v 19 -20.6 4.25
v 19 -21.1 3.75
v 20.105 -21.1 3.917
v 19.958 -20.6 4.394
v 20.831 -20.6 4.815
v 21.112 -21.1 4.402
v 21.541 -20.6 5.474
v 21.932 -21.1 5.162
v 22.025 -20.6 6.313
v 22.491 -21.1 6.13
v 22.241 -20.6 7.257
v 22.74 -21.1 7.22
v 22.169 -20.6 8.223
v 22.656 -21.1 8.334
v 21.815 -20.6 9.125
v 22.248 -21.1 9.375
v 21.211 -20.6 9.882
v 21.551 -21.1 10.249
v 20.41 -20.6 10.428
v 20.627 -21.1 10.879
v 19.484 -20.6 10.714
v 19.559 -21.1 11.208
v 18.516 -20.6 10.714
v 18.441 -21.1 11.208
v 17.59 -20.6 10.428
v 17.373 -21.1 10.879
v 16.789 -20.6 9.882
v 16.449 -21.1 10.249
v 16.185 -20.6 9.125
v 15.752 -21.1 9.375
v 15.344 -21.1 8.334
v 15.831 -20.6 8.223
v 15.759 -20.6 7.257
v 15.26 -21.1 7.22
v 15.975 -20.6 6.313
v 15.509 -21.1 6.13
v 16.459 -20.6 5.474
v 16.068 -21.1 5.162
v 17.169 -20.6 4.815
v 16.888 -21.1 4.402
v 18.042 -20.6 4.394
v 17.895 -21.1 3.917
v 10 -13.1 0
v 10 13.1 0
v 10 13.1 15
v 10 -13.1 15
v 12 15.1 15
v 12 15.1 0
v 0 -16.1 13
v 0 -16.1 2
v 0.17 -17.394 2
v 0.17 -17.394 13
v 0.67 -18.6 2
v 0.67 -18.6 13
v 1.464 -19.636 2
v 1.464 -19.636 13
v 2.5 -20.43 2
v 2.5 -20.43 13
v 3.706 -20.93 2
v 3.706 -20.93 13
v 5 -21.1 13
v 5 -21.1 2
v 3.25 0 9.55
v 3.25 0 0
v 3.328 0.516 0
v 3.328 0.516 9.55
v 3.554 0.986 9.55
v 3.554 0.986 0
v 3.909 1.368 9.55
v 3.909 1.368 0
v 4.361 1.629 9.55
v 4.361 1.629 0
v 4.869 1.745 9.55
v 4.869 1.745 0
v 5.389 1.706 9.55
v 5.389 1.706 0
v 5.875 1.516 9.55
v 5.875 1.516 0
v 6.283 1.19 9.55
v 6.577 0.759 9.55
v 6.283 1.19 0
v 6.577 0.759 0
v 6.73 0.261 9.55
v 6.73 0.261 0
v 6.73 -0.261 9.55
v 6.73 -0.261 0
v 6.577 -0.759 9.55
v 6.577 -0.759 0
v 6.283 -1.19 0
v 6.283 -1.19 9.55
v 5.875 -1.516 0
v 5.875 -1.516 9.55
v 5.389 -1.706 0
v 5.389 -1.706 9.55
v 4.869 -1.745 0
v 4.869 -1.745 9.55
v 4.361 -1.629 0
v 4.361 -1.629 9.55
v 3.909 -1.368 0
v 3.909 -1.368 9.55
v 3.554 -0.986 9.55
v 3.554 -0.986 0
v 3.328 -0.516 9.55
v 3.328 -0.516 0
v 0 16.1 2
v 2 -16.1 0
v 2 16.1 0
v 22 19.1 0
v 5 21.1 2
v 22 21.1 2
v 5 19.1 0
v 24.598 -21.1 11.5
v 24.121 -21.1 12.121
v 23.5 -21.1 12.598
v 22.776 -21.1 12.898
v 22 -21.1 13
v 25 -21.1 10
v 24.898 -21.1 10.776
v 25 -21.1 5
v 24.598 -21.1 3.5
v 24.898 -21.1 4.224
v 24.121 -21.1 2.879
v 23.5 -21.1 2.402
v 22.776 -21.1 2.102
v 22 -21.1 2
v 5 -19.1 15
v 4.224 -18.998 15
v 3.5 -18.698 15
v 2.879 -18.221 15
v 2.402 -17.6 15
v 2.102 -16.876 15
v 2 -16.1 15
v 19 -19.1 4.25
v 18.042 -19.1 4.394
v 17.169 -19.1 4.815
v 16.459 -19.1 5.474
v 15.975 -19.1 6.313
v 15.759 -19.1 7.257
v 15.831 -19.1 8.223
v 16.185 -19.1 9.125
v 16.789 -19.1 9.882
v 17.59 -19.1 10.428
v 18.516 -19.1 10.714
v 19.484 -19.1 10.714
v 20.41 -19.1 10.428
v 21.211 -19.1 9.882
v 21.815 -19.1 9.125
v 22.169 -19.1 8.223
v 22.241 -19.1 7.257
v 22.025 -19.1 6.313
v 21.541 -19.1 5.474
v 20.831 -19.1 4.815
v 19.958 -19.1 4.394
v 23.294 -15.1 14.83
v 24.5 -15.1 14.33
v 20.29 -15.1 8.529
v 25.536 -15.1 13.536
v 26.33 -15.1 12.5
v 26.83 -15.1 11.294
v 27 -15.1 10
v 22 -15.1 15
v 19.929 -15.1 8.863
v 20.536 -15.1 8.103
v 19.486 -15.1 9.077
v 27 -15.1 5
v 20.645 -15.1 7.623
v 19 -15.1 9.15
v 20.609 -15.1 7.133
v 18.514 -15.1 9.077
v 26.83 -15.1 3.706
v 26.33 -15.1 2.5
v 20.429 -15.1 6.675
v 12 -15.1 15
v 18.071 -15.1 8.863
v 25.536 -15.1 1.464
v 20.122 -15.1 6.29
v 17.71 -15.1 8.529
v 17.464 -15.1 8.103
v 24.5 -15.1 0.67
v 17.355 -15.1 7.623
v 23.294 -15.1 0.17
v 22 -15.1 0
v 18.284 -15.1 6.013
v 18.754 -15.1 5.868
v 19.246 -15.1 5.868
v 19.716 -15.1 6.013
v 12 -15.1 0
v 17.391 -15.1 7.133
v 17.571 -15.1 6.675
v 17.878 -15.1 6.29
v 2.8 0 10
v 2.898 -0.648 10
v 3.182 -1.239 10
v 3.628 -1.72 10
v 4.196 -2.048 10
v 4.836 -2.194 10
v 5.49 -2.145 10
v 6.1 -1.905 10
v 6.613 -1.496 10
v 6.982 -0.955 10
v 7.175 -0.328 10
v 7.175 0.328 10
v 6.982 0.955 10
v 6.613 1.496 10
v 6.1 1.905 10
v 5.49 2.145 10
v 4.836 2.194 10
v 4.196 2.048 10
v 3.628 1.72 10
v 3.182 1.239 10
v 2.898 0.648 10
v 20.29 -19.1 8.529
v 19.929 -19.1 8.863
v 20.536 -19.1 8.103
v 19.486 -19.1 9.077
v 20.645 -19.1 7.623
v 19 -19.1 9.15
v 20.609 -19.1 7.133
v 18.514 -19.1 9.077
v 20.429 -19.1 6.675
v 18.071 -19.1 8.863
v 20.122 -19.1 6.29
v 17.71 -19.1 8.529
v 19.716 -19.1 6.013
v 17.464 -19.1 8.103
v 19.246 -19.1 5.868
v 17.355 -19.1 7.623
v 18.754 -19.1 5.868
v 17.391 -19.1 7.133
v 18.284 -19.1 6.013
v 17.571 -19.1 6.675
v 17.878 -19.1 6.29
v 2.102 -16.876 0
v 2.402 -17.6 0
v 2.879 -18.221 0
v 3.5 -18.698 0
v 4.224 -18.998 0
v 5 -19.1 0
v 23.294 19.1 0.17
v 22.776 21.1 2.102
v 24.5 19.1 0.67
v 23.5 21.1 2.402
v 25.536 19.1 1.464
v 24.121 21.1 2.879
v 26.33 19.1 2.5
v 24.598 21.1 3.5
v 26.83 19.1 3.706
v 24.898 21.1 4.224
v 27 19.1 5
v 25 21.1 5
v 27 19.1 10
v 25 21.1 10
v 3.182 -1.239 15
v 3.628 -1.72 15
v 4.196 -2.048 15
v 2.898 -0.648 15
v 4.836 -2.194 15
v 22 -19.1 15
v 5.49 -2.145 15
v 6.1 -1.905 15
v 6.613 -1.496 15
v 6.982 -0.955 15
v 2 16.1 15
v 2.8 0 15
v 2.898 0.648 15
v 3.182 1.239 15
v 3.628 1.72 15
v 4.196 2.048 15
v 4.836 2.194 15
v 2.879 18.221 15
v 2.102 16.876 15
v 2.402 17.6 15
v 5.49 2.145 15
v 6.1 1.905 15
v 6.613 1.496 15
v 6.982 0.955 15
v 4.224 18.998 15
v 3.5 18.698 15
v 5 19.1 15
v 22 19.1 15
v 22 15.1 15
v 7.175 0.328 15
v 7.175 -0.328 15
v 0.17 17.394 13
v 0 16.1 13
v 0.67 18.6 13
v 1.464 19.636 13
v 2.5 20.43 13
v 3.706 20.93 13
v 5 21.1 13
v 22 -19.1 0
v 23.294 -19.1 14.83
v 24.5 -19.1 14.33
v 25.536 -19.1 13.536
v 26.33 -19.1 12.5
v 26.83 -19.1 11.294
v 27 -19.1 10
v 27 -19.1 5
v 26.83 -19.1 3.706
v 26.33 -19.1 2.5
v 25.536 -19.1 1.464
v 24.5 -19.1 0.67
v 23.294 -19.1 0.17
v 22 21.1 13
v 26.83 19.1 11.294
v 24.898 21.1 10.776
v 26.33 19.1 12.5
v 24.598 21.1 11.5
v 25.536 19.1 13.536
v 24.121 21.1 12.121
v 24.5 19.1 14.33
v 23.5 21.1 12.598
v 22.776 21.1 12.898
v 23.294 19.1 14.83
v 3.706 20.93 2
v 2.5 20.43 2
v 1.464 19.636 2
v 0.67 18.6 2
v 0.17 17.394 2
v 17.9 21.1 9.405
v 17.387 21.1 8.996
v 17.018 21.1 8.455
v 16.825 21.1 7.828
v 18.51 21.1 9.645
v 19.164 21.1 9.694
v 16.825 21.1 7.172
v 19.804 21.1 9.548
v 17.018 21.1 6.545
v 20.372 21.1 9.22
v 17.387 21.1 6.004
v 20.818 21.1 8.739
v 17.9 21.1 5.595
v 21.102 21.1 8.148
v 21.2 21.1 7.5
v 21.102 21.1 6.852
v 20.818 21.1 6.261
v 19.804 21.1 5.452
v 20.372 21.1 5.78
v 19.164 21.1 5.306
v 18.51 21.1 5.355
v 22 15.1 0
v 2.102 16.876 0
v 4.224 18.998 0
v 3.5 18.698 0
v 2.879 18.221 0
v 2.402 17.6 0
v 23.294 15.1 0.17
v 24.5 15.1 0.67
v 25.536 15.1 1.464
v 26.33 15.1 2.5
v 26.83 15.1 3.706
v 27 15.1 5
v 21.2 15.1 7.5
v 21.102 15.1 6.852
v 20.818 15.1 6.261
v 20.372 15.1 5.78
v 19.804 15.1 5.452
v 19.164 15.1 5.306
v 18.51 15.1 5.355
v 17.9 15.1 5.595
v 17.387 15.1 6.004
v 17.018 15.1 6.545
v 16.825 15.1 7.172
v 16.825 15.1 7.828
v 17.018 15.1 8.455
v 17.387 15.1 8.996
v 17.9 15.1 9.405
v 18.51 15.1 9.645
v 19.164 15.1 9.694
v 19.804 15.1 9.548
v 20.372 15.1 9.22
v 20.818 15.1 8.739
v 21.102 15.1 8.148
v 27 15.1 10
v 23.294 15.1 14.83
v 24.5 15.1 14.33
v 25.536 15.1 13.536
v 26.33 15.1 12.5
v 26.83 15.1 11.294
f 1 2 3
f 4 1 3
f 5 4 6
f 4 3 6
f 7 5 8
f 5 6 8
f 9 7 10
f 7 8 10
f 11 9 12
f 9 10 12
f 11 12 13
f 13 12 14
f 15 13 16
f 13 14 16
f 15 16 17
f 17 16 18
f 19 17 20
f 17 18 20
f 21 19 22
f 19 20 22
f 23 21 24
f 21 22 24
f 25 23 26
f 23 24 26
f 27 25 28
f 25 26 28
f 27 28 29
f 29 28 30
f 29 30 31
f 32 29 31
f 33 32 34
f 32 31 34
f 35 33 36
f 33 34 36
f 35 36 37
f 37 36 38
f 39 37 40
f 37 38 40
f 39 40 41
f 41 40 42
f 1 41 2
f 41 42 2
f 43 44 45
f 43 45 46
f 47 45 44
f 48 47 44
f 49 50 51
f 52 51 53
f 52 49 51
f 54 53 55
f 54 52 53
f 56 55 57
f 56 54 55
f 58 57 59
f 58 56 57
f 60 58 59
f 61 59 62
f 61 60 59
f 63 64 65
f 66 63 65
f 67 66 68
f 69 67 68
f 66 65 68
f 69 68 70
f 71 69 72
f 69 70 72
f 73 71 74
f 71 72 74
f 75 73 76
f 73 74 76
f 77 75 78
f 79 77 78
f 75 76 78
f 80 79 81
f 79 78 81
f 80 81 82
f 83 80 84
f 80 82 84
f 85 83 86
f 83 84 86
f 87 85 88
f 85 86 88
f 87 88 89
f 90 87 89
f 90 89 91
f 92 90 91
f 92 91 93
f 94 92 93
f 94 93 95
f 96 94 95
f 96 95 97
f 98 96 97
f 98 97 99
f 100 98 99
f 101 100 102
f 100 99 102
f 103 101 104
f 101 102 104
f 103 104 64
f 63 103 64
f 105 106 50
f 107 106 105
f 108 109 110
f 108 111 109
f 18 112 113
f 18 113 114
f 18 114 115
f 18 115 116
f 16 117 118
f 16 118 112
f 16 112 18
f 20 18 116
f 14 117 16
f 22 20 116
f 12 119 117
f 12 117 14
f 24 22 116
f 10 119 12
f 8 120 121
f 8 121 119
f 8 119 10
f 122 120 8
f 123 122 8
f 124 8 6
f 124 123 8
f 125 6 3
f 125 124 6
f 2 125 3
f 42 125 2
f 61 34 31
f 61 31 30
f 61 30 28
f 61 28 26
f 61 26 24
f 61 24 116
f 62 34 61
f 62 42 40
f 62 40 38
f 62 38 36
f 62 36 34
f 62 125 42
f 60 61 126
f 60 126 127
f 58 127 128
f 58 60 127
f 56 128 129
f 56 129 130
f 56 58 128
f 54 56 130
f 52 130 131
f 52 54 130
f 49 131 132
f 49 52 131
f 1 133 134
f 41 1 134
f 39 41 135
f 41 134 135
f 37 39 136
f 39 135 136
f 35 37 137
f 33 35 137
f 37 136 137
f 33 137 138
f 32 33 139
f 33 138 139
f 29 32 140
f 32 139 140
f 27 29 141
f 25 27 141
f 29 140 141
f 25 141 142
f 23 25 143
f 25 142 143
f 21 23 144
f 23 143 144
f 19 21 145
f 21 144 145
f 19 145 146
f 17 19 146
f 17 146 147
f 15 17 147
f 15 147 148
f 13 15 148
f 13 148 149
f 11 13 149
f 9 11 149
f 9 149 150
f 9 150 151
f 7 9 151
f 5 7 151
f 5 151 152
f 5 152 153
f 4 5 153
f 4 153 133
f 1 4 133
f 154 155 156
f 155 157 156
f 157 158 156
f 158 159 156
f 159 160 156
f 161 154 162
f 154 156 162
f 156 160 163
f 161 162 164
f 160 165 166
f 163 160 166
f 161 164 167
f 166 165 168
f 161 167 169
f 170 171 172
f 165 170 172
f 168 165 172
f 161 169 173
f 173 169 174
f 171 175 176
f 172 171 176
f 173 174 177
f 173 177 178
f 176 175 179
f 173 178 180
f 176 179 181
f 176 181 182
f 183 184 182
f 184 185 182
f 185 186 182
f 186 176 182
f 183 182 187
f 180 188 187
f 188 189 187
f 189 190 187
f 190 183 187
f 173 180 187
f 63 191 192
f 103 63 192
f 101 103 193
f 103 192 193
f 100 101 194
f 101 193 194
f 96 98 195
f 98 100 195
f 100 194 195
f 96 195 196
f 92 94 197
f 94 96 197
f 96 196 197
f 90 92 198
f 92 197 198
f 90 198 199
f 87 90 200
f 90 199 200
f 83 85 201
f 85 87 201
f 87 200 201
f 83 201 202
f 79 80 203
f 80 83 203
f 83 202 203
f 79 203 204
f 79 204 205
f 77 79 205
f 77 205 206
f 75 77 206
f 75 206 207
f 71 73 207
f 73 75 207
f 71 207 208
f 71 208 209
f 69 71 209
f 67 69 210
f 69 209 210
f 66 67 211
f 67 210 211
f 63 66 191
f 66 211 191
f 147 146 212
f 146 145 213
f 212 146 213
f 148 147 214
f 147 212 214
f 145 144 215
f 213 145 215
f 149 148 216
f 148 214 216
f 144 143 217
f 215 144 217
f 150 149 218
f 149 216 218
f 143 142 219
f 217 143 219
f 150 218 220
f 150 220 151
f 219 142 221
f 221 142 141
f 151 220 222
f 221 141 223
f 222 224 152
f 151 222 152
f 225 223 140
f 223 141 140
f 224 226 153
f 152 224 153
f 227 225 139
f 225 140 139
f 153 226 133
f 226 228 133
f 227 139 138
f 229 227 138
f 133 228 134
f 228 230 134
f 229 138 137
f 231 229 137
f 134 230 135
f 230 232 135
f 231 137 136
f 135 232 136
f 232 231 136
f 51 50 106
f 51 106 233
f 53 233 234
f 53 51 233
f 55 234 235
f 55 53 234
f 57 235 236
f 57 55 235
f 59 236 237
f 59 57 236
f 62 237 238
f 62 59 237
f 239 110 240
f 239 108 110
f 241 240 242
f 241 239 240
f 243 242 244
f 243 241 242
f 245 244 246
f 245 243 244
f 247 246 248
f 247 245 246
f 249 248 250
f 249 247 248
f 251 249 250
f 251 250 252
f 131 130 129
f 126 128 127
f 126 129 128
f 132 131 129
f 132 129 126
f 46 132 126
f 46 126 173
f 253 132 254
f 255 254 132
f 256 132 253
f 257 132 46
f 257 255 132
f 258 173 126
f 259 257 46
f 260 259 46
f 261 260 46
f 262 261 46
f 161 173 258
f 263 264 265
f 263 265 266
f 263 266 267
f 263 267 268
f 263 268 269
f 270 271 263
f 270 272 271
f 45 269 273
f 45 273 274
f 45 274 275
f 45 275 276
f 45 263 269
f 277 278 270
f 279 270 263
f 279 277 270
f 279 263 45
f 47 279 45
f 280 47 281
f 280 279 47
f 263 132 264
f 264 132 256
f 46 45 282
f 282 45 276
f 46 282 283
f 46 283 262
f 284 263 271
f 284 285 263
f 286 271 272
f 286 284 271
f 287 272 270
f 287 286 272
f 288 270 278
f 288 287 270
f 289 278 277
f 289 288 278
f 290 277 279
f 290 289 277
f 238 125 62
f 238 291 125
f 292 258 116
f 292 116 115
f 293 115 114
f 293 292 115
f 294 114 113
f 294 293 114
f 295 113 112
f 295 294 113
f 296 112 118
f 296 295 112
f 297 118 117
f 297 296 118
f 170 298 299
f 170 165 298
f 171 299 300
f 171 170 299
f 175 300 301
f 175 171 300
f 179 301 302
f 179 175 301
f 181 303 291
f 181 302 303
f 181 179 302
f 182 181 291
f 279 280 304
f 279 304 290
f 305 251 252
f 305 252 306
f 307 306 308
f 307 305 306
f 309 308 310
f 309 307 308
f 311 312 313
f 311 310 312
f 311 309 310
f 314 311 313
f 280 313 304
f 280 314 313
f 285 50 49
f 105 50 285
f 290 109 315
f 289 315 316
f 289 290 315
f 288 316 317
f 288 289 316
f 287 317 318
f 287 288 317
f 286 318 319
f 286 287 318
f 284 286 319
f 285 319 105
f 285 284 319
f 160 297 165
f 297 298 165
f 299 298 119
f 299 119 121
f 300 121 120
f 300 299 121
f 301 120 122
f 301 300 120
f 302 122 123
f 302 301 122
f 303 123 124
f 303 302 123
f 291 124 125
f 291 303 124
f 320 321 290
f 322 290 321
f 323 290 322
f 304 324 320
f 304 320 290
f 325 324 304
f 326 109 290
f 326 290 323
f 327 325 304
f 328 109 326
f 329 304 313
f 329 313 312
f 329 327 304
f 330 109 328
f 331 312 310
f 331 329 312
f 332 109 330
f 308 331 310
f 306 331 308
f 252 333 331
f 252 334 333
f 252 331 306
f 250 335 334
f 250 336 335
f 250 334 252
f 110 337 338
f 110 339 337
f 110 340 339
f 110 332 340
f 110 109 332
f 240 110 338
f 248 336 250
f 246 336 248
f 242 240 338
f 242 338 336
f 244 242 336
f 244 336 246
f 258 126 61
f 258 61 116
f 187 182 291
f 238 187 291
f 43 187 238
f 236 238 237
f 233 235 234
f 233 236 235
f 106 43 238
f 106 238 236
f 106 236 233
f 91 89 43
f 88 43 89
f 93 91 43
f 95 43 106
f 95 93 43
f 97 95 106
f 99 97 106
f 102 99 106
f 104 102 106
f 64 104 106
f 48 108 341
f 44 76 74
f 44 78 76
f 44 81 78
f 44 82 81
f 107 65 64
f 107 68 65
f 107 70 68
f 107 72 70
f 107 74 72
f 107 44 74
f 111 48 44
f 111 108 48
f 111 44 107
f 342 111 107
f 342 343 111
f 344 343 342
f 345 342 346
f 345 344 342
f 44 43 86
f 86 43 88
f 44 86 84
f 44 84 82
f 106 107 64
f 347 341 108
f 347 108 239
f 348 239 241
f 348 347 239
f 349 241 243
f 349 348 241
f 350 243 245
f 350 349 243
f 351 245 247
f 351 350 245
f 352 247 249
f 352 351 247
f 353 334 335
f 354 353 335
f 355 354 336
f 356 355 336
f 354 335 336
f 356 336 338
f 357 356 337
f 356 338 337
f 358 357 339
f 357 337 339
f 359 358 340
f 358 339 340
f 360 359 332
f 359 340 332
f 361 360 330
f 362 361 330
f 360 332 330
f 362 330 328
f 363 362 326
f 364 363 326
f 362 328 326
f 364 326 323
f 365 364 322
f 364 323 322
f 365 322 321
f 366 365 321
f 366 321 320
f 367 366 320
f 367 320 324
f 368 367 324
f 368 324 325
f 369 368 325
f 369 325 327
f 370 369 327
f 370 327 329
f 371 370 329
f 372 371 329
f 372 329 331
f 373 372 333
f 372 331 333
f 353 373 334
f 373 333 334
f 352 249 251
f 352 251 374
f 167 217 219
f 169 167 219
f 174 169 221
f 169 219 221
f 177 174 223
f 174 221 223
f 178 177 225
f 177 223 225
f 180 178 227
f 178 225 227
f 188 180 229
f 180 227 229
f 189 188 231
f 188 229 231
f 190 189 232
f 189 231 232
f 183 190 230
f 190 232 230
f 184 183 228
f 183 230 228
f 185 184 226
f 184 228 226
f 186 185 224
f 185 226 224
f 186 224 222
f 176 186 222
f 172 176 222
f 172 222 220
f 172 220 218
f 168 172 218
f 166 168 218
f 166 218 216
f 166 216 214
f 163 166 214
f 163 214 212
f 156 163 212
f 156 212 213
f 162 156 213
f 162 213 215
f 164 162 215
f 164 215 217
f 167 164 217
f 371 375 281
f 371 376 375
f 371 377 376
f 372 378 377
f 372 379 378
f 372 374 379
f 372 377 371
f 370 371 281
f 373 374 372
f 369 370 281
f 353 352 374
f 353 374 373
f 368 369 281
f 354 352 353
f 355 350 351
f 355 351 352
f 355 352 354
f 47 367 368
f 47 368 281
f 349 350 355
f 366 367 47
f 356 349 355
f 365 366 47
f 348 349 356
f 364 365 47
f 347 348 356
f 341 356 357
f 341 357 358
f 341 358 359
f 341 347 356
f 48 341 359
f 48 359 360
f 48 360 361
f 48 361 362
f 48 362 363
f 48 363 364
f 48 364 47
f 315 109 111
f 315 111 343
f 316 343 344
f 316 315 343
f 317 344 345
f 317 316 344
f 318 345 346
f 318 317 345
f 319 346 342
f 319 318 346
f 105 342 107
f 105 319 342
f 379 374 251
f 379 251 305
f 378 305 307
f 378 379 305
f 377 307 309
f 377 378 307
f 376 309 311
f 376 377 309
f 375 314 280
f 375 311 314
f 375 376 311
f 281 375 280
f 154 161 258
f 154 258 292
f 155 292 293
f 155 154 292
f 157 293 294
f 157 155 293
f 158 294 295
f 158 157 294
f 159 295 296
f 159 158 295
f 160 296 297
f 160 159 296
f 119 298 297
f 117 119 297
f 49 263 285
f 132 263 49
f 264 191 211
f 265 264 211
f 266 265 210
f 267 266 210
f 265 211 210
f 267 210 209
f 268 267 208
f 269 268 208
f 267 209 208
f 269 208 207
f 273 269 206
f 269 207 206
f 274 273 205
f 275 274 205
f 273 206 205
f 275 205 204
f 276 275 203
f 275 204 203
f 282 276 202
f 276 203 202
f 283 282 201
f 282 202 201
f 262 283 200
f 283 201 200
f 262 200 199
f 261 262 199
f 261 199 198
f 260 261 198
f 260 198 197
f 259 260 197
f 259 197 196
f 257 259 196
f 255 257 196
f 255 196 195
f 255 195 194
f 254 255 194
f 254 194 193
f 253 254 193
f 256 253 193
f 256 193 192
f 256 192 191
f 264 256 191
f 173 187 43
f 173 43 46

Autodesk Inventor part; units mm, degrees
ref_plane "YZ Plane" through (0, 0, 0) normal (1, 0, 0) x (0, 1, 0)
ref_plane "XZ Plane" through (0, 0, 0) normal (0, 1, 0) x (-1, 0, 0)
ref_plane "XY Plane" through (0, 0, 0) normal (0, 0, 1) x (1, 0, 0)
sketch "スケッチ1" plane through (0, 0, 0) normal (0, 0, 1) x (1, 0, 0)
  line L0 (0, 21.1) -> (10, 21.1)
  line L1 (10, 21.1) -> (10, -21.1)
  line L2 (10, -21.1) -> (0, -21.1)
  line L3 (0, -21.1) -> (0, 21.1)
  line L4 (10, 21.1) -> (27, 21.1)
  line L5 (27, 21.1) -> (27, 15.1)
  line L6 (27, 15.1) -> (10, 15.1)
  line L7 (10, 15.1) -> (10, 21.1)
  line L8 (10, -21.1) -> (27, -21.1)
  line L9 (27, -21.1) -> (27, -15.1)
  line L10 (27, -15.1) -> (10, -15.1)
  line L11 (10, -15.1) -> (10, -21.1)
  point P0 (0, 0)
  point P1 (19, 15.1)
  point P2 (10, 15.1)
  dimension "d3" = 8
  dimension "d4" = 10
  dimension "d5" = 30.2
  dimension "d7" = 9
  dimension "d22" = 15.1
  dimension "d25" = 6
  dimension "d26" = 6
extrude "押し出し1" add sketch "スケッチ1" along normal blind 15
sketch "スケッチ2" plane through (0, 21.1, 0) normal (0, 1, 0) x (1, 0, 0)
  line L0 (27, -15) -> (0, -15) projected
  line L1 (27, 0) -> (27, -15) projected
  line L2 (27, 0) -> (10, 0) projected
  line L3 (10, 0) -> (10, -15) projected
  line L4 (27, -15) -> (10, -15) projected
  line L5 (27, 0) -> (27, -15) projected
  point P0 (19, -7.5)
  dimension "d10" = 8
  dimension "d11" = 7.5
hole "穴1" at (19, 21.1, 7.5) direction (0, -1, 0) diameter 3.3 depth 58
sketch "スケッチ3" plane through (0, 21.1, 0) normal (0, 1, 0) x (1, 0, 0)
  circle A0 centre (19, -7.5) radius 1.65 projected
  circle A1 centre (19, -7.5) radius 2.2
  dimension "d19" = 4.4
extrude "押し出し2" cut sketch "スケッチ3" against normal blind 10 contours A0 | A1
fillet "フィレット2" radius 5 6 edges at (27, 18.1, 0) (27, -18.1, 0) (27, -18.1, 15) (27, 18.1, 15) (0, 21.1, 7.5) (0, -21.1, 7.5)
sketch "スケッチ7" plane through (0, 0, 0) normal (0, 0, -1) x (-1, 0, 0)
  circle A0 centre (-5, 0) radius 2.2
  point P0 (0, 0)
  dimension "d55" = 4.4
extrude "押し出し5" cut sketch "スケッチ7" against normal blind 21.25
sketch "スケッチ8" plane through (0, 0, 0) normal (0, 0, -1) x (-1, 0, 0)
  circle A0 centre (-5, 0) radius 2.2 projected
  circle A1 centre (-5, 0) radius 1.75
  point P0 (0, 0)
  dimension "d65" = 3.5
extrude "押し出し6" add sketch "スケッチ8" against normal blind 10
chamfer "面取り8" distance 0.45 angle 45 1 edges at (6.75, 0, 10)
chamfer "面取り9" distance 2 angle 45 16 edges at (13.5, 21.1, 15) (1.4645, 19.6355, 15) (0, 0, 15) (1.4645, -19.6355, 15) (13.5, -21.1, 15) (25.5355, -21.1, 13.5355) (27, -21.1, 7.5) (25.5355, -21.1, 1.4645) (13.5, -21.1, 0) (1.4645, -19.6355, 0) (0, 0, 0) (1.4645, 19.6355, 0) (13.5, 21.1, 0) (25.5355, 21.1, 1.4645) (27, 21.1, 7.5) (25.5355, 21.1, 13.5355)
chamfer "面取り10" distance 2 angle 45 2 edges at (10, -15.1, 7.5) (10, 15.1, 7.5)
sketch "スケッチ9" plane through (5, -21.1, 2) normal (0, -1, 0) x (1, 0, 0)
  circle A0 centre (14, 5.5) radius 1.65 projected
  point P0 (-5, -2)
hole "穴3" at (19, -21.1, 7.5) direction (0, 1, 0) diameter 6.5 depth 2
chamfer "面取り11" distance 0.5 angle 45 1 edges at (19, -21.1, 10.75)
equation "\"d22\" = 0.5 * d5"
properties part number "Print_Parts_I" material "PC/ABS プラスチック"
